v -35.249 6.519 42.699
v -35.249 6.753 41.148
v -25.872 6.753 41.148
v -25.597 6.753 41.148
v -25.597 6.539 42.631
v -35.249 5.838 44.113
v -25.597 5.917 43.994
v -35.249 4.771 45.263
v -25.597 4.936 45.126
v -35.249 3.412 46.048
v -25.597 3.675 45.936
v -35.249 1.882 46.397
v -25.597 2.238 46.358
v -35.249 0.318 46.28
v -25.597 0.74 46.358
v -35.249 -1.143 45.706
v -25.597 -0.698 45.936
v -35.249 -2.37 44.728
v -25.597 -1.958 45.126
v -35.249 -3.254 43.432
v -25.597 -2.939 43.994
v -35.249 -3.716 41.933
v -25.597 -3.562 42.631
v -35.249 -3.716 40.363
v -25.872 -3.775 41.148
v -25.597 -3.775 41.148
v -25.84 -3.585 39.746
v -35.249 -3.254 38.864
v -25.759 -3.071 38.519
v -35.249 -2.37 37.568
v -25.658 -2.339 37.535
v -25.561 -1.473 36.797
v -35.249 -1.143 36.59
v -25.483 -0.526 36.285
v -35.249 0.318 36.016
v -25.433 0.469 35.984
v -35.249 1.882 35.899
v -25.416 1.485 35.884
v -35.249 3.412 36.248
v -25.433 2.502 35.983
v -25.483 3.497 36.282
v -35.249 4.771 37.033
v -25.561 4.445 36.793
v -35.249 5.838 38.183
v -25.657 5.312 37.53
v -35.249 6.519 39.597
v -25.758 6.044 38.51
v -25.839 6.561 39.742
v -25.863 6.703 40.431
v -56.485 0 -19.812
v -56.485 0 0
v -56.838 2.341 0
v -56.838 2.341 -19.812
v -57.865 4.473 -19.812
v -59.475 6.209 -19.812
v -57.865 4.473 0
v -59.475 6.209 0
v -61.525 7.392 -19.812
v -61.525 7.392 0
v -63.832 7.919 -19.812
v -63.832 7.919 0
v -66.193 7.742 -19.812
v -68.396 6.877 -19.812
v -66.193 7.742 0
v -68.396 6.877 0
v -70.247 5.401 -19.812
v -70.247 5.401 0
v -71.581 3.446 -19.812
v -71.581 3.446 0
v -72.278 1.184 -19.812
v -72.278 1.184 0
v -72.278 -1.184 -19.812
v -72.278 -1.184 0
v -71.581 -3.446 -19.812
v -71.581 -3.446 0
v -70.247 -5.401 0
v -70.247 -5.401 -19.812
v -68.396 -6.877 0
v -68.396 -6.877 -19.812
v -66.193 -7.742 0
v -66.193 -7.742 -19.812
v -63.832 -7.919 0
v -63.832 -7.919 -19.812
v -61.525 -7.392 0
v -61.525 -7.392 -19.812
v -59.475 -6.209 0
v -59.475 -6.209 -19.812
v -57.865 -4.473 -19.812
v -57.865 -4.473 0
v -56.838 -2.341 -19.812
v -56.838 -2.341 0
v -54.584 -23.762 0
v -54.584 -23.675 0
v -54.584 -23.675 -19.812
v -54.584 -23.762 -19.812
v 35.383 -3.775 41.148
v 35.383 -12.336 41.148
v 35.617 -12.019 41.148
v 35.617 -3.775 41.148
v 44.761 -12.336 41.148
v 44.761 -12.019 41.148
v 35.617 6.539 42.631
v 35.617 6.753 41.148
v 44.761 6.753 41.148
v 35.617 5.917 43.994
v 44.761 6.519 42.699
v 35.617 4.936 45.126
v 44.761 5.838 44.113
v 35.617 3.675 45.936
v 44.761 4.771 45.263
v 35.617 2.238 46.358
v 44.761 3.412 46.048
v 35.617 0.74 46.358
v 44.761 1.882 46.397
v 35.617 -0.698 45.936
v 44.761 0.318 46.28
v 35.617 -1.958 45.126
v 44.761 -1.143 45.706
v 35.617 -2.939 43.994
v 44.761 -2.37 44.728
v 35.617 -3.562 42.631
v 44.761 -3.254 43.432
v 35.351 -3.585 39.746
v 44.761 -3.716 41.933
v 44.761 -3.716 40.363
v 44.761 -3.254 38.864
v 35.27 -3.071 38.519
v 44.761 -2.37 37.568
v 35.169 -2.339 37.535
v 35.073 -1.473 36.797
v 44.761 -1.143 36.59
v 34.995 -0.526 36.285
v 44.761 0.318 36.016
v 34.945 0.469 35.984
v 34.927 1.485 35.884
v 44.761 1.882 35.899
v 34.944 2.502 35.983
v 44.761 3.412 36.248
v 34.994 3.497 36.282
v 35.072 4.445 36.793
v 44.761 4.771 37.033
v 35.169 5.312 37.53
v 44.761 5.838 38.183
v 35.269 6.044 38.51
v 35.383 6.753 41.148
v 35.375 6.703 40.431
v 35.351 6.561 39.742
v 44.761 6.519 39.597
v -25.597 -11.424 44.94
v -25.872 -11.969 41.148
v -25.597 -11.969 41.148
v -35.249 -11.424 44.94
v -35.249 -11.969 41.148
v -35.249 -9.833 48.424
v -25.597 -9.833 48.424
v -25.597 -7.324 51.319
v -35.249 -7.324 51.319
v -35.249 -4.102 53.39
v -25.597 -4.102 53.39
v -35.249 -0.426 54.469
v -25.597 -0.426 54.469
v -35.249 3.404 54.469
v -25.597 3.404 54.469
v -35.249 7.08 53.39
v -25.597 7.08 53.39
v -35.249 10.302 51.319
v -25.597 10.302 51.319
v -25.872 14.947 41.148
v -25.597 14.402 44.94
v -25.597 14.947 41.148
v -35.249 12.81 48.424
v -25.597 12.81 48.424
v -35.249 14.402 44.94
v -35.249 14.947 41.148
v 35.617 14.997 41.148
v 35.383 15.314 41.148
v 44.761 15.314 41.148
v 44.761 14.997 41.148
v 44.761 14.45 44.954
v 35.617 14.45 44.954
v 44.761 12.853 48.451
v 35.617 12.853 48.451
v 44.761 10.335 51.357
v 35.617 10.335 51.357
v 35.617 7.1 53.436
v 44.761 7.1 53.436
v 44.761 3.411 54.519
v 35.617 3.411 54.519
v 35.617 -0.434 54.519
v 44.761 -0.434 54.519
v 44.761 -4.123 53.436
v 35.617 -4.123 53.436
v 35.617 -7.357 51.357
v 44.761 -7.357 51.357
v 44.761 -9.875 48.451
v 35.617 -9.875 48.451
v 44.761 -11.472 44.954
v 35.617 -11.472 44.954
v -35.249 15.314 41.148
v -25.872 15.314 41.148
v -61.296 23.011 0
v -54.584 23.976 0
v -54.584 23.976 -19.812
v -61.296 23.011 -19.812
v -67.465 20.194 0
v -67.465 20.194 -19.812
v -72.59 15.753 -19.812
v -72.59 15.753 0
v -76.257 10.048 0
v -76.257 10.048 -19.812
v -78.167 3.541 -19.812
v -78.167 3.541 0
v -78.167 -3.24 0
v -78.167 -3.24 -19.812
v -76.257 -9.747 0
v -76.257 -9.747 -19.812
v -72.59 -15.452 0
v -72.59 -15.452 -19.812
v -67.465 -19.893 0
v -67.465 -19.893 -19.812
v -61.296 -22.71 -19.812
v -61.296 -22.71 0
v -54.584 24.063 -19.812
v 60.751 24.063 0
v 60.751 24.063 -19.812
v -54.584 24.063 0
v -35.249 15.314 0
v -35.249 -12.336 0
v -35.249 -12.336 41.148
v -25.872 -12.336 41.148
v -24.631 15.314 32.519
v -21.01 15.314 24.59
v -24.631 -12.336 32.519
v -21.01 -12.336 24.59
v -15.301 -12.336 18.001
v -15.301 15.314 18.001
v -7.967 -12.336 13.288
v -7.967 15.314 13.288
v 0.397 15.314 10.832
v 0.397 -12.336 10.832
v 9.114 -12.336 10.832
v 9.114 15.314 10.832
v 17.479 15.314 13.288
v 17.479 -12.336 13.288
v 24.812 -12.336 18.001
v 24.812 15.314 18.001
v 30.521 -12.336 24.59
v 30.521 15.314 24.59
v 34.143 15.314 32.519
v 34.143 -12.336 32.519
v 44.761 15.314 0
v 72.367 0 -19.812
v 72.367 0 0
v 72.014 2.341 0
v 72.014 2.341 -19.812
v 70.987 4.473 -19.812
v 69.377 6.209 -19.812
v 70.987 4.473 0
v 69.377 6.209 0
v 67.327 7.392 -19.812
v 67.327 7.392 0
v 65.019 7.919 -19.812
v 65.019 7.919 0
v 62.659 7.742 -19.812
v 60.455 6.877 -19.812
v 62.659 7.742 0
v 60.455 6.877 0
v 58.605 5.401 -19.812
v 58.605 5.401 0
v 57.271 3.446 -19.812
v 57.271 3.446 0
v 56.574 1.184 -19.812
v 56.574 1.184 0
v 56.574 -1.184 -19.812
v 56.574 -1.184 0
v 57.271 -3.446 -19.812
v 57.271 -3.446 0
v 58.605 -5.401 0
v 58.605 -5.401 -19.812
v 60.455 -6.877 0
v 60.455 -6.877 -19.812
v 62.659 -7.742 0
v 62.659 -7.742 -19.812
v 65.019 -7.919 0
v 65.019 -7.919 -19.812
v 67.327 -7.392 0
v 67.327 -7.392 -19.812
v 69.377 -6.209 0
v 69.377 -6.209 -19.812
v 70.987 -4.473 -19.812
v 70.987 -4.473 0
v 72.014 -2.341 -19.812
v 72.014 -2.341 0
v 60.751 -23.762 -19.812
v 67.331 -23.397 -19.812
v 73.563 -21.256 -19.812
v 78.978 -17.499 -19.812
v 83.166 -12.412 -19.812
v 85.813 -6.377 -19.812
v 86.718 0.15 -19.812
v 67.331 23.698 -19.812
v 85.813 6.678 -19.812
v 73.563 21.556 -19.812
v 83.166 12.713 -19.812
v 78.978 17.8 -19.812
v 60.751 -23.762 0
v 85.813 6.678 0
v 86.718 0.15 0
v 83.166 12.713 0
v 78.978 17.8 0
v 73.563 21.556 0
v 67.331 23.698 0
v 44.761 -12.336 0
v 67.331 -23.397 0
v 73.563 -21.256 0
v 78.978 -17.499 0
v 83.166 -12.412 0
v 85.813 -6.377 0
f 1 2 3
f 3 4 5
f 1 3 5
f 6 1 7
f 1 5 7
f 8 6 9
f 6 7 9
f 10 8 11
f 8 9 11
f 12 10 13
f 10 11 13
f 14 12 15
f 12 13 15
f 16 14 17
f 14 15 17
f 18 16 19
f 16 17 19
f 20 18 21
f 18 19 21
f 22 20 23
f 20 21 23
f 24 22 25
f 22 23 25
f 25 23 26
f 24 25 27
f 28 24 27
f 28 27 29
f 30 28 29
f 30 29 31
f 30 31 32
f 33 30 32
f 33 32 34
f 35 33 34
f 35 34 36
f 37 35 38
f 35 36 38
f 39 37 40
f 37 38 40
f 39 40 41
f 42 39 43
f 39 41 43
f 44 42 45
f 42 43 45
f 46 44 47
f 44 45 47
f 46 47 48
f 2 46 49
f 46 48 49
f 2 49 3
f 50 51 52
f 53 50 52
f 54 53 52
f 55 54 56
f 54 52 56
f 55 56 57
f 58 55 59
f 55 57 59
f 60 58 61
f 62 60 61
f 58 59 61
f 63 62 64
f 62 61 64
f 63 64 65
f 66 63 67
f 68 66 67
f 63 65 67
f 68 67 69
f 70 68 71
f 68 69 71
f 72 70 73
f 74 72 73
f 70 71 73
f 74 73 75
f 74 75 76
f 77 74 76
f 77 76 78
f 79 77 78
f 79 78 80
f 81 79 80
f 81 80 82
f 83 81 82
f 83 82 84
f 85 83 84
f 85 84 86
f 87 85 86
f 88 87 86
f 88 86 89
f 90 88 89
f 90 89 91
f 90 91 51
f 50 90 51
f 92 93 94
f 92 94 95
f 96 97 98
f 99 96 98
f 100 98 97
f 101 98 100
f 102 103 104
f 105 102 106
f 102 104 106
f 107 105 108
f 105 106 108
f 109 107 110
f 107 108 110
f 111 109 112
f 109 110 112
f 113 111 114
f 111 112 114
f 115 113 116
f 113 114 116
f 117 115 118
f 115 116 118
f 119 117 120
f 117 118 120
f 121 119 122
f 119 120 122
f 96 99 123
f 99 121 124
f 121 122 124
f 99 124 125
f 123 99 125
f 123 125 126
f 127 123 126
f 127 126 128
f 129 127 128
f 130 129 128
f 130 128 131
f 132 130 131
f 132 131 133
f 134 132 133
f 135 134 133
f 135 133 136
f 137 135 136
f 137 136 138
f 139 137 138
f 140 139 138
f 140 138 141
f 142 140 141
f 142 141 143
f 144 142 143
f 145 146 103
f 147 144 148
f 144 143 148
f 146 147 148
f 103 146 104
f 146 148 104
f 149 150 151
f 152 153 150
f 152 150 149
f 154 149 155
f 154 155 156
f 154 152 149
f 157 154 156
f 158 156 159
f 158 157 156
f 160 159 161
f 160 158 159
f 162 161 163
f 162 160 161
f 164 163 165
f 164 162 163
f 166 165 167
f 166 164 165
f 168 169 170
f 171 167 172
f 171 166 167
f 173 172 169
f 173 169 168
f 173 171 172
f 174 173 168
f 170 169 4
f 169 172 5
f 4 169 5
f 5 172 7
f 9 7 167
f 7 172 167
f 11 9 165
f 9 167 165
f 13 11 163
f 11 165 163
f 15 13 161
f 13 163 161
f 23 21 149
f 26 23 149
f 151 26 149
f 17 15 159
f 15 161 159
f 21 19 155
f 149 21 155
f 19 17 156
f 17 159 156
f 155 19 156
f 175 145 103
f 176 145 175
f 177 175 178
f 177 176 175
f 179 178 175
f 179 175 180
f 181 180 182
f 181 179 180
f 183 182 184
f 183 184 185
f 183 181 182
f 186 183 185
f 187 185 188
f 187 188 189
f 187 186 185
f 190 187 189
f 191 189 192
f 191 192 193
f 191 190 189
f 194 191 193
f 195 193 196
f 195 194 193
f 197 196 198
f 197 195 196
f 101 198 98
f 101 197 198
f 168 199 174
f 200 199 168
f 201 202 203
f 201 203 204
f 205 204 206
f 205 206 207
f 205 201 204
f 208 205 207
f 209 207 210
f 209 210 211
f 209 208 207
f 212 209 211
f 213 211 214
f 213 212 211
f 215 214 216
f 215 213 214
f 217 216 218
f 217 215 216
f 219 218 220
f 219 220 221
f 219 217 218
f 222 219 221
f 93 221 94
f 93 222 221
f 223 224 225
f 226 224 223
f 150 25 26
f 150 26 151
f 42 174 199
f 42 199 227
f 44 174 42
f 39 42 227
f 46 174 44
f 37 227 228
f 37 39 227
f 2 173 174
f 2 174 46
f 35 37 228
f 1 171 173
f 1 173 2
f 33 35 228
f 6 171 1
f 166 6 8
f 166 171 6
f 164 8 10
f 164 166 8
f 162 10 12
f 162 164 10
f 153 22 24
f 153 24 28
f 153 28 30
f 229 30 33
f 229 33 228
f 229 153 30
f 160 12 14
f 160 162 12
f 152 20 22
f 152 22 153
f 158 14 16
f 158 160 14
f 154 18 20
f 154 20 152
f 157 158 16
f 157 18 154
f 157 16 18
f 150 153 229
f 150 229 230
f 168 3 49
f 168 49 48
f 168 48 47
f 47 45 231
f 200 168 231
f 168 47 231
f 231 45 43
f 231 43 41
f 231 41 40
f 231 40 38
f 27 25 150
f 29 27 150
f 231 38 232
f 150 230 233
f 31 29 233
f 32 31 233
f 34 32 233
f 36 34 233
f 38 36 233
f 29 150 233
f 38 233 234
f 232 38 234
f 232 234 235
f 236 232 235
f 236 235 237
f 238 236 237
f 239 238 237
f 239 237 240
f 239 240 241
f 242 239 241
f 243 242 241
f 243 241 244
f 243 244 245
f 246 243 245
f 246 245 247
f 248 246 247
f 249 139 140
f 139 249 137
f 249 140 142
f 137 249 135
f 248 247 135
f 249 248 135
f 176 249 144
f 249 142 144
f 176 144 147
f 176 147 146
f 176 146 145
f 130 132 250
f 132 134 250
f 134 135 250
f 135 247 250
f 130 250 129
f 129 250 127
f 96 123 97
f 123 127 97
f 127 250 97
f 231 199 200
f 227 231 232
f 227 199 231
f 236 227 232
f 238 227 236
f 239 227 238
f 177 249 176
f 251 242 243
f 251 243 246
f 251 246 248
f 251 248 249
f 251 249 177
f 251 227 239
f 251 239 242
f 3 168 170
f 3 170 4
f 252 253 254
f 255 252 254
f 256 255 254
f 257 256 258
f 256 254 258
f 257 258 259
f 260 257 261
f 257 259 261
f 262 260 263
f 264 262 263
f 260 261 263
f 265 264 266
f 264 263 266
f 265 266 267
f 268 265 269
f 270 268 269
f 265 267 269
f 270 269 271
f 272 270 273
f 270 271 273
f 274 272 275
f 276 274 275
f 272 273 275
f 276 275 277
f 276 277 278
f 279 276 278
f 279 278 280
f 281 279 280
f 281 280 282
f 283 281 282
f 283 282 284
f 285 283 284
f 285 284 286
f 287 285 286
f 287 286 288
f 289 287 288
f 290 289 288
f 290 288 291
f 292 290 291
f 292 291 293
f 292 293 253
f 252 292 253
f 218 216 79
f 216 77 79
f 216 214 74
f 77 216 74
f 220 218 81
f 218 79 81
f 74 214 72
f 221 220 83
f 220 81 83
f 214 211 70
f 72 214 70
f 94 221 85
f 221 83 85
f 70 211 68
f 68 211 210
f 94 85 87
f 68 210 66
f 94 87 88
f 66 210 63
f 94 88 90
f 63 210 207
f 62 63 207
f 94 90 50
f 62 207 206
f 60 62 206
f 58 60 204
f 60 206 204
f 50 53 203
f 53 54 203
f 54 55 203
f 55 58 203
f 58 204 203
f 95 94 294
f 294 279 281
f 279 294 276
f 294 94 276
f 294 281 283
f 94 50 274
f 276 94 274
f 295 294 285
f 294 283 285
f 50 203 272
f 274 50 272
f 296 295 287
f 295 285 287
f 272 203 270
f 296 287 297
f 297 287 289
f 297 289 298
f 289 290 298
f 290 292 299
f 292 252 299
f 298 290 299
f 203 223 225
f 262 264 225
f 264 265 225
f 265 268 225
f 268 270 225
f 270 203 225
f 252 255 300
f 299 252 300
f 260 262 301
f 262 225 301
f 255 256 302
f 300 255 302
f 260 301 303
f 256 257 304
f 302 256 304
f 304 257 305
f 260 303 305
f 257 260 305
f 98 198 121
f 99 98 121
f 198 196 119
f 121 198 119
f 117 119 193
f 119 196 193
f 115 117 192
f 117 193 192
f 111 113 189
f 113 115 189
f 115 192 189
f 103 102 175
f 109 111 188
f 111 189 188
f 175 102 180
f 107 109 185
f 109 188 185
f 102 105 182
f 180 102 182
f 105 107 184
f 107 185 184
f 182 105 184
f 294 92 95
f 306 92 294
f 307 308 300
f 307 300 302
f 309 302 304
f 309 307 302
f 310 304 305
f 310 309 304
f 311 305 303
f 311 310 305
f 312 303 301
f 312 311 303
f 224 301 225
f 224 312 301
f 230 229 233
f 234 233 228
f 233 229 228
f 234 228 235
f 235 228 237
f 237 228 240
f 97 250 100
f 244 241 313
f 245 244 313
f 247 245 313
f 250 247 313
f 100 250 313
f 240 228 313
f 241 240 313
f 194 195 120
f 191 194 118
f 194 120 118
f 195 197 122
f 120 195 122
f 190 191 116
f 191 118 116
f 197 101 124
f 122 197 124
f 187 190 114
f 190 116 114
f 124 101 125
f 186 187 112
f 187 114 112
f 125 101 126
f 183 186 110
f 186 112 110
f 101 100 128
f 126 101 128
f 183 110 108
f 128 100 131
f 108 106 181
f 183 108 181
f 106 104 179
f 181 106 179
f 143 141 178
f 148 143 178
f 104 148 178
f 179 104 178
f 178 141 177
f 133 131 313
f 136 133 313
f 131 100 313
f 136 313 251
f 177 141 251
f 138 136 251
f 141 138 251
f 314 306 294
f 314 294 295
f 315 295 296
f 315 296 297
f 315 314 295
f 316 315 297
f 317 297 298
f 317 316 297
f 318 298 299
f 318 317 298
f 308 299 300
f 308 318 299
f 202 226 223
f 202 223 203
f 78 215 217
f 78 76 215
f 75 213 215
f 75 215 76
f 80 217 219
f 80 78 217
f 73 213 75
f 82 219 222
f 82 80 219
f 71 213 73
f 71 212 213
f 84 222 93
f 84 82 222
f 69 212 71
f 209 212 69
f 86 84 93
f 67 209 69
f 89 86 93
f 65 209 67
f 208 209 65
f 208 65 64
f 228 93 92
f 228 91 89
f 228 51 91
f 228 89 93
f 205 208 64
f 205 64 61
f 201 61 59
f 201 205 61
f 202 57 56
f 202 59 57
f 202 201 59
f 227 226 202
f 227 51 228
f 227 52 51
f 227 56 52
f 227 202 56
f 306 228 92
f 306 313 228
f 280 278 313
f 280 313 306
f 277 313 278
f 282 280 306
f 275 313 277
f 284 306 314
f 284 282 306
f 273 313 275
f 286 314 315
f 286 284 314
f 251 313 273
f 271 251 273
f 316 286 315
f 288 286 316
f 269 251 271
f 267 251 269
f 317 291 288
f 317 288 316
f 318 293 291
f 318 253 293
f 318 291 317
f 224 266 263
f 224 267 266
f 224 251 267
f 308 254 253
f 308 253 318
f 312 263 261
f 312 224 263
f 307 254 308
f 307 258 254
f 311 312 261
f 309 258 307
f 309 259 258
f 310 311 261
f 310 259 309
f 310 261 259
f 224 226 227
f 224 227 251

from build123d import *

# Parameters (mm, degrees)
F1_DEPTH  = 19.812
F2_R      = 7.9410723376
F3_DEPTH  = 53.594
F4_DEPTH  = 72.136
F5_W      = 80.0100006163
F5_H      = 27.649730444
F6_DEPTH  = 41.148
F8_DEPTH  = 64.516
F10_DEPTH = 9.652
F12_DEPTH = 9.144
F13_R     = 5.2636855274
F14_DEPTH = 114.046


with BuildPart() as f1:
    # F0 (on Top) → F1 (new body)
    with BuildSketch(Plane.XY):
        with BuildLine():
            Line((62.7238675952, 24.0631569177), (60.7514679523, 24.0631569177))
            ThreePointArc((60.7514679523, 24.0631569177), (38.7298974086, 0.1503936946), (60.7514679523, -23.7623695284))
            Line((60.7514679523, -23.7623695284), (62.7238675952, -23.7623695284))
            Line((62.7238675952, -23.7623695284), (62.7238675952, 24.0631569177))
        make_face()
        with BuildLine():
            Line((60.7514679523, 24.0631569177), (-54.584030062, 24.0631569177))
            Line((-54.584030062, 24.0631569177), (-54.584030062, 23.9759786156))
            ThreePointArc((-54.584030062, 23.9759786156), (-37.7367973986, 16.997626358), (-30.758445141, 0.1503936946))
            ThreePointArc((-30.758445141, 0.1503936946), (-37.7367973986, -16.6968389687), (-54.584030062, -23.6751912263))
            Line((-54.584030062, -23.6751912263), (-54.584030062, -23.7623695284))
            Line((-54.584030062, -23.7623695284), (60.7514679523, -23.7623695284))
            ThreePointArc((60.7514679523, -23.7623695284), (38.7298974086, 0.1503936946), (60.7514679523, 24.0631569177))
        make_face()
        with BuildLine():
            Line((-54.584030062, -23.6751912263), (-54.584030062, 23.9759786156))
            ThreePointArc((-54.584030062, 23.9759786156), (-78.4096149829, 0.1503936946), (-54.584030062, -23.6751912263))
        make_face()
        with BuildLine():
            ThreePointArc((86.7178377817, 0.1503936946), (78.9778656739, 17.8002705149), (60.7514679523, 24.0631569177))
            Line((60.7514679523, 24.0631569177), (62.7238675952, 24.0631569177))
            Line((62.7238675952, 24.0631569177), (62.7238675952, -23.7623695284))
            Line((62.7238675952, -23.7623695284), (60.7514679523, -23.7623695284))
            ThreePointArc((60.7514679523, -23.7623695284), (78.9778656739, -17.4994831256), (86.7178377817, 0.1503936946))
        make_face()
        with BuildLine():
            ThreePointArc((-30.758445141, 0.1503936946), (-37.7367973986, 16.997626358), (-54.584030062, 23.9759786156))
            Line((-54.584030062, 23.9759786156), (-54.584030062, -23.6751912263))
            ThreePointArc((-54.584030062, -23.6751912263), (-37.7367973986, -16.6968389687), (-30.758445141, 0.1503936946))
        make_face()
    extrude(amount=-F1_DEPTH)

    # F2 (on face) → F3 (cut)
    with BuildSketch(Plane.XY):
        with Locations((-64.4258856773, 0)):
            Circle(F2_R)
    extrude(amount=-F3_DEPTH, mode=Mode.SUBTRACT)

    # F2 (on face) → F4 (cut)
    with BuildSketch(Plane.XY):
        with Locations((-64.4258856773, 0)):
            Circle(F2_R)
        with Locations((64.4258856773, 0)):
            Circle(F2_R)
    extrude(amount=-F4_DEPTH, mode=Mode.SUBTRACT)

    # F5 (on face) → F6 (join)
    with BuildSketch(Plane.XY):
        with Locations((4.7556925565, 1.4888346195)):
            Rectangle(F5_W, F5_H)
    extrude(amount=F6_DEPTH)

    # F7 (on face) → F8 (cut)
    with BuildSketch(Plane.XZ.offset(12.3360306025)):
        with BuildLine():
            Line((-25.8717667552, 41.148), (35.3831518682, 41.148))
            ThreePointArc((35.3831518682, 41.148), (4.7556925565, 71.7754593117), (-25.8717667552, 41.148))
        make_face()
        with BuildLine():
            ThreePointArc((-25.8717667552, 41.148), (4.7556925565, 10.5205406883), (35.3831518682, 41.148))
            Line((35.3831518682, 41.148), (-25.8717667552, 41.148))
        make_face()
    extrude(amount=-F8_DEPTH, mode=Mode.SUBTRACT)

    # F9 (on face) → F10 (join)
    with BuildSketch(Plane(origin=(-35.2493077517, 0, 0), x_dir=(0, -1, 0), z_dir=(-1, 0, 0))):
        with BuildLine():
            Line((-14.9469008146, 41.148), (11.9692315755, 41.148))
            ThreePointArc((11.9692315755, 41.148), (-1.4888346195, 54.606066195), (-14.9469008146, 41.148))
        make_face()
    extrude(amount=-F10_DEPTH)

    # F11 (on face) → F12 (join)
    with BuildSketch(Plane.YZ.offset(44.7606928647)):
        with BuildLine():
            Line((-12.0193907988, 41.148), (14.9970600378, 41.148))
            ThreePointArc((14.9970600378, 41.148), (1.4888346195, 54.6562254183), (-12.0193907988, 41.148))
        make_face()
    extrude(amount=-F12_DEPTH)

    # F13 (on face) → F14 (cut)
    with BuildSketch(Plane.YZ.offset(44.7606928647)):
        with Locations((1.4888346195, 41.148)):
            Circle(F13_R)
    extrude(amount=-F14_DEPTH, mode=Mode.SUBTRACT)


solid = f1.part
